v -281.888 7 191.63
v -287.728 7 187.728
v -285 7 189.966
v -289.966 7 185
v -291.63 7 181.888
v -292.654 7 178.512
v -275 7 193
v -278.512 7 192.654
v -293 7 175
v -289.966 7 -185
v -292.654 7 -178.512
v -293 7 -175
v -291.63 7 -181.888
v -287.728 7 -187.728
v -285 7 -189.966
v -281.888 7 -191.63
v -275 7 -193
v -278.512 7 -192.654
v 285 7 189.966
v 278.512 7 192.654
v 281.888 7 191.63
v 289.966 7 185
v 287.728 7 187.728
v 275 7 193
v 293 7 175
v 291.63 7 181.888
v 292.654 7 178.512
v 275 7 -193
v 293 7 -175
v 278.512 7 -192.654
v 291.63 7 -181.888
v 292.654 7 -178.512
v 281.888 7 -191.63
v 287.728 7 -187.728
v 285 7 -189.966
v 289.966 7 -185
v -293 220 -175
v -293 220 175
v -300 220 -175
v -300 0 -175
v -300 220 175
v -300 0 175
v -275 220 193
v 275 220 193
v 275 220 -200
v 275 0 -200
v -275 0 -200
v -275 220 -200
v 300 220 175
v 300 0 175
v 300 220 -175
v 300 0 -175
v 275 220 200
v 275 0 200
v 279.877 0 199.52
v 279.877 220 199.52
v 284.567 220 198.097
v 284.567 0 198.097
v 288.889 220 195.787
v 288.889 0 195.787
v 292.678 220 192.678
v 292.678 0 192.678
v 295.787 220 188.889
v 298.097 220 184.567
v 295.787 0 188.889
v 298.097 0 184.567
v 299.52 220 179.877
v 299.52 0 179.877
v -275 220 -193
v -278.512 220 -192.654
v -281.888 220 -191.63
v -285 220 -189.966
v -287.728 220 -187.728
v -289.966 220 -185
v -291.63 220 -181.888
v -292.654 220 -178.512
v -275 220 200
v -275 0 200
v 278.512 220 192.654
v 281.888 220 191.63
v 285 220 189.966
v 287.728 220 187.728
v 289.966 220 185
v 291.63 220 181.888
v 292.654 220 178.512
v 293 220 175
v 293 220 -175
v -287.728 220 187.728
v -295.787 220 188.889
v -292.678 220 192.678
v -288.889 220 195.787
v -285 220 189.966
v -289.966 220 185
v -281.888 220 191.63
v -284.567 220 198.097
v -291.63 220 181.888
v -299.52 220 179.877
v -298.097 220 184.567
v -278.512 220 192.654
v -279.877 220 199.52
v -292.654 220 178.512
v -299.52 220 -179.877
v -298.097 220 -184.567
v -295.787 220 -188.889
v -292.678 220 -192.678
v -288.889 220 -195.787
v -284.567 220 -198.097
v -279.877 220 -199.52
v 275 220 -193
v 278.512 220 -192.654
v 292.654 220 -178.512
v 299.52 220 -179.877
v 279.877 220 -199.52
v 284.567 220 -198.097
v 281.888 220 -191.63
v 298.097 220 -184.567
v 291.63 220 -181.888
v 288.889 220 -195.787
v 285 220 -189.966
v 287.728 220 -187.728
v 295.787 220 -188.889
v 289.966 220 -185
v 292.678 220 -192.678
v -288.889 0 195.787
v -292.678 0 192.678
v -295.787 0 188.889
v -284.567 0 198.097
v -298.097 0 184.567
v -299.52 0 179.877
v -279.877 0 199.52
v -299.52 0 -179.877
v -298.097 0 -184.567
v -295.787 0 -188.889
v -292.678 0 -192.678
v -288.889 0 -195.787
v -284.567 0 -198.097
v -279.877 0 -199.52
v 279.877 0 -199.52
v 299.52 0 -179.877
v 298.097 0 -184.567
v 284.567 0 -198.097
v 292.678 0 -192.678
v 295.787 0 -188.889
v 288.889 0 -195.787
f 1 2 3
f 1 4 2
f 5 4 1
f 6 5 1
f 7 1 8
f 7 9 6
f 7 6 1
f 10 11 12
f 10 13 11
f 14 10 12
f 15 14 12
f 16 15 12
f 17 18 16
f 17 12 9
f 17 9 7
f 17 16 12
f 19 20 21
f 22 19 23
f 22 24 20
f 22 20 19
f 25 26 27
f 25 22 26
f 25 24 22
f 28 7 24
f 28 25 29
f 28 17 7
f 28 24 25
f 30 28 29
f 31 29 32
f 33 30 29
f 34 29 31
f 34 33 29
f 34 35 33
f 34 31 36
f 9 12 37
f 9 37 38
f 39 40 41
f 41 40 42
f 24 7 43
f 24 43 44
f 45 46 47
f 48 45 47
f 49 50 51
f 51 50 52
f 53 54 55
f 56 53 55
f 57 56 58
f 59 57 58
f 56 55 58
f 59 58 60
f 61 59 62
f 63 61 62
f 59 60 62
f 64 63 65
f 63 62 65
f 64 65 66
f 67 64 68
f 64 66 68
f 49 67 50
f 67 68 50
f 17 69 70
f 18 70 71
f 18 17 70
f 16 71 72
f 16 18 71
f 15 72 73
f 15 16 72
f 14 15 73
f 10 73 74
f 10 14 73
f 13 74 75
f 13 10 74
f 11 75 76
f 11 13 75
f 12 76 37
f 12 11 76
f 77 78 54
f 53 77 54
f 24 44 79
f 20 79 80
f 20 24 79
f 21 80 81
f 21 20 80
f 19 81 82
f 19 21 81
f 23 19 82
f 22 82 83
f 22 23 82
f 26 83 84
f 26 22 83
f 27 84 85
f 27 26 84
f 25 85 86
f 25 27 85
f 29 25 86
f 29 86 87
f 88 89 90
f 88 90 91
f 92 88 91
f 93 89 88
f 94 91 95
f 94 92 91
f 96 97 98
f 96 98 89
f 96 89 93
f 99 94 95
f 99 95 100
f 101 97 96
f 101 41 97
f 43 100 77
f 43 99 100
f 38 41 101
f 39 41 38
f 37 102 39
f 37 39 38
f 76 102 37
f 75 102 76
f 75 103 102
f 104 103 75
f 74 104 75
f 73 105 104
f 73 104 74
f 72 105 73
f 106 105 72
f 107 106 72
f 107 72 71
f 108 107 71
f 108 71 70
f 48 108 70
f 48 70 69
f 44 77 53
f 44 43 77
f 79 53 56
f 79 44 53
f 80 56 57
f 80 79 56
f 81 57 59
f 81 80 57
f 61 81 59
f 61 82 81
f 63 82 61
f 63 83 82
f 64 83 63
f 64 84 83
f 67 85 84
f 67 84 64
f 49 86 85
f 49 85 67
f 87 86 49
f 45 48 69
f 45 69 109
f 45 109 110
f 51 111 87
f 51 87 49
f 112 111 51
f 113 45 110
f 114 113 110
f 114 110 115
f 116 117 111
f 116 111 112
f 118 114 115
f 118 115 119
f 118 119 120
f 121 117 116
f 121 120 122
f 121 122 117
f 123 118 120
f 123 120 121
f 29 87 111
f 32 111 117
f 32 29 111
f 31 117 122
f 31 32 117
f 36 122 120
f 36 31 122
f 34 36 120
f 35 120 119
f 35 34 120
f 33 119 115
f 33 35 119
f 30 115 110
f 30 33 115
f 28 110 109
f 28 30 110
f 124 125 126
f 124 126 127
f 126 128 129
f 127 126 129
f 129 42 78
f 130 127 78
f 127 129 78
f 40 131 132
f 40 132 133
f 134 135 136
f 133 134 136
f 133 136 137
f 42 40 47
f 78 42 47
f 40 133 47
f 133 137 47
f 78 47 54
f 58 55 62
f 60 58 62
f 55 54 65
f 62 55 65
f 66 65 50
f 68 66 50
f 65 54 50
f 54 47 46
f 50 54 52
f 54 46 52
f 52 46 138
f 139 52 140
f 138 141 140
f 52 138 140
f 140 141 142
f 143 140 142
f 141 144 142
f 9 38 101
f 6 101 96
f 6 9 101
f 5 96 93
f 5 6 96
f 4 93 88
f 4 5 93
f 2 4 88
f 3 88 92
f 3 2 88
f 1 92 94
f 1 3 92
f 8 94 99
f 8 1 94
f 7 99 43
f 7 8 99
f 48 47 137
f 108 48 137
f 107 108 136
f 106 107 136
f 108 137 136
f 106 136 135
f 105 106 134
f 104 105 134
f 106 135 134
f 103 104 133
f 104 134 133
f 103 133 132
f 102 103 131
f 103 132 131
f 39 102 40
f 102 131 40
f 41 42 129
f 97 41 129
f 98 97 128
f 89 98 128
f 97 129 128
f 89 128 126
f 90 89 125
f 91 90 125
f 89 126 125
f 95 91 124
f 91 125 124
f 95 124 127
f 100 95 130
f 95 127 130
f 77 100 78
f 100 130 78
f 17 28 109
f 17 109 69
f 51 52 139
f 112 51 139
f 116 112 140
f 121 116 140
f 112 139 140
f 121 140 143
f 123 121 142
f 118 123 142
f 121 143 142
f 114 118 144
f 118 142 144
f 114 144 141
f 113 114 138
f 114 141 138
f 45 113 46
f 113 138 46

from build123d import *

# Parameters (mm, degrees)
BOSS_EXTRUDE1_DEPTH = 220
SHELL1_T            = -7


with BuildPart() as part:
    # Sketch1 → Boss-Extrude1 (new body)
    with BuildSketch(Plane(origin=(0, 0, 0), x_dir=(1, 0, 0), z_dir=(0, 1, 0))):
        with BuildLine():
            Line((-275, -200), (275, -200))
            ThreePointArc((275, -200), (292.67766953, -192.67766953), (300, -175))
            Line((300, -175), (300, 175))
            ThreePointArc((300, 175), (292.67766953, 192.67766953), (275, 200))
            Line((275, 200), (-275, 200))
            ThreePointArc((-275, 200), (-292.67766953, 192.67766953), (-300, 175))
            Line((-300, 175), (-300, -175))
            ThreePointArc((-300, -175), (-292.67766953, -192.67766953), (-275, -200))
        make_face()
    extrude(amount=BOSS_EXTRUDE1_DEPTH)

    # Shell1
    shell1_openings = [part.faces().sort_by_distance(p)[0] for p in [
        (0, 220, 0),
    ]]
    offset(amount=SHELL1_T, openings=shell1_openings, kind=Kind.INTERSECTION)


solid = part.part
